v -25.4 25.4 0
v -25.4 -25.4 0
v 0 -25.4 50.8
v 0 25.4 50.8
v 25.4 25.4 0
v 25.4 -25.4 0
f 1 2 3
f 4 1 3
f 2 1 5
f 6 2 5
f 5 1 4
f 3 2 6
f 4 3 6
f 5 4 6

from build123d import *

# Parameters (mm, degrees)
F0_W     = 50.8
F0_H     = 50.8
F1_DEPTH = 50.8
F3_DEPTH = 76.2
F5_DEPTH = 76.2


with BuildPart() as f1:
    # F0 (on Top) → F1 (new body)
    with BuildSketch(Plane.XY):
        Rectangle(F0_W, F0_H)
    extrude(amount=F1_DEPTH)

    # F2 (on face) → F3 (cut)
    with BuildSketch(Plane.XZ.offset(25.4)):
        Polygon((-25.4, 0), (0, 50.8), (-25.4, 50.8), align=None)
    extrude(amount=-F3_DEPTH, mode=Mode.SUBTRACT)

    # F4 (on face) → F5 (cut)
    with BuildSketch(Plane.XZ.offset(25.4)):
        Polygon((25.4, 50.8), (0, 50.8), (25.4, 0), align=None)
    extrude(amount=-F5_DEPTH, mode=Mode.SUBTRACT)


solid = f1.part
